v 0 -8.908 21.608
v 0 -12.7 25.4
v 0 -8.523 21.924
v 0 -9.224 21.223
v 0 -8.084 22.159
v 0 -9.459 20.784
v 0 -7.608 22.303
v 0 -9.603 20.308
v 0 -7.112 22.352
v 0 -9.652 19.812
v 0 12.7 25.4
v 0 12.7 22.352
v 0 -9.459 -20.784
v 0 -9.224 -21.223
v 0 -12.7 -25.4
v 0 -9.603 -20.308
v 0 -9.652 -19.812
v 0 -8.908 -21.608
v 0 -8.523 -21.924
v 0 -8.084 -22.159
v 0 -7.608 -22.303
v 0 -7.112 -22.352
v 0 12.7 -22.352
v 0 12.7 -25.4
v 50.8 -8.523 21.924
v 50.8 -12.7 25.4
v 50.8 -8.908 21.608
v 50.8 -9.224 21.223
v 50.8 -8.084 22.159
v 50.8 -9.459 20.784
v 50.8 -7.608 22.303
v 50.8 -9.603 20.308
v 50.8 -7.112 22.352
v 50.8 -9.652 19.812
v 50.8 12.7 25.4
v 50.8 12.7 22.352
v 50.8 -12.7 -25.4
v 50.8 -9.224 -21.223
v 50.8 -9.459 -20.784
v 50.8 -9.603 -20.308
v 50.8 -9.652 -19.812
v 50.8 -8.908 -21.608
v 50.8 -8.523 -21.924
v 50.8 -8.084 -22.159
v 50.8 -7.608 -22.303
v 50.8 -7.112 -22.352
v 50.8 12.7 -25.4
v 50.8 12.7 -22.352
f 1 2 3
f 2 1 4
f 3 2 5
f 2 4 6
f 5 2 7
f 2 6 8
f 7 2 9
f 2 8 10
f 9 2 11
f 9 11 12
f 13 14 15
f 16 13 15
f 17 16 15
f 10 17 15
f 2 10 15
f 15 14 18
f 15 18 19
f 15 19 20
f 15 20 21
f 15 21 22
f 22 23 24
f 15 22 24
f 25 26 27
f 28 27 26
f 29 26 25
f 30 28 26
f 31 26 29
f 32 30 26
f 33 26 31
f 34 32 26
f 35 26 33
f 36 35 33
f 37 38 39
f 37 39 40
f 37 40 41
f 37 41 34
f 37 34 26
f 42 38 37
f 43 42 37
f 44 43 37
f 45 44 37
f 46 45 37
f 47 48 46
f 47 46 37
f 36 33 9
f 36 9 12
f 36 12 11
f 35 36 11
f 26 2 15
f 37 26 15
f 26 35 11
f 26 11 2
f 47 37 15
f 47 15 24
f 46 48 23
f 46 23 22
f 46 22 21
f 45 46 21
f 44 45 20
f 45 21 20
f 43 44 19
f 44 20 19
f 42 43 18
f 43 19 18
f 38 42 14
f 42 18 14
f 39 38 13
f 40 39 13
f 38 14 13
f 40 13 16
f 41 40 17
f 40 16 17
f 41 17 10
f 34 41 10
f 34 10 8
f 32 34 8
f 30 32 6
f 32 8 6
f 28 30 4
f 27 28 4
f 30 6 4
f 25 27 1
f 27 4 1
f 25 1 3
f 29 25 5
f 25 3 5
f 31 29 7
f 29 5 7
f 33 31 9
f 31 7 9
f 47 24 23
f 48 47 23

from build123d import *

# Parameters (mm, degrees)
BOSS_EXTRUDE1_DEPTH = 50.8


with BuildPart() as part:
    # Sketch1 → Boss-Extrude1 (new body)
    with BuildSketch(Plane(origin=(0, 0, 0), x_dir=(0, 0, -1), z_dir=(1, 0, 0))):
        with BuildLine():
            Line((-22.352, -7.112), (-22.352, 9.652))
            Line((-22.352, 9.652), (-22.352, 12.7))
            Line((-22.352, 12.7), (-25.4, 12.7))
            Line((-25.4, 12.7), (-25.4, -12.7))
            Line((-25.4, -12.7), (25.4, -12.7))
            Line((25.4, -12.7), (25.4, 12.7))
            Line((25.4, 12.7), (22.352, 12.7))
            Line((22.352, 12.7), (22.352, 9.652))
            Line((22.352, 9.652), (22.352, -7.112))
            ThreePointArc((22.352, -7.112), (21.608051224, -8.908051224), (19.812, -9.652))
            Line((19.812, -9.652), (-19.812, -9.652))
            ThreePointArc((-19.812, -9.652), (-21.608051224, -8.908051224), (-22.352, -7.112))
        make_face()
    extrude(amount=BOSS_EXTRUDE1_DEPTH)


solid = part.part
